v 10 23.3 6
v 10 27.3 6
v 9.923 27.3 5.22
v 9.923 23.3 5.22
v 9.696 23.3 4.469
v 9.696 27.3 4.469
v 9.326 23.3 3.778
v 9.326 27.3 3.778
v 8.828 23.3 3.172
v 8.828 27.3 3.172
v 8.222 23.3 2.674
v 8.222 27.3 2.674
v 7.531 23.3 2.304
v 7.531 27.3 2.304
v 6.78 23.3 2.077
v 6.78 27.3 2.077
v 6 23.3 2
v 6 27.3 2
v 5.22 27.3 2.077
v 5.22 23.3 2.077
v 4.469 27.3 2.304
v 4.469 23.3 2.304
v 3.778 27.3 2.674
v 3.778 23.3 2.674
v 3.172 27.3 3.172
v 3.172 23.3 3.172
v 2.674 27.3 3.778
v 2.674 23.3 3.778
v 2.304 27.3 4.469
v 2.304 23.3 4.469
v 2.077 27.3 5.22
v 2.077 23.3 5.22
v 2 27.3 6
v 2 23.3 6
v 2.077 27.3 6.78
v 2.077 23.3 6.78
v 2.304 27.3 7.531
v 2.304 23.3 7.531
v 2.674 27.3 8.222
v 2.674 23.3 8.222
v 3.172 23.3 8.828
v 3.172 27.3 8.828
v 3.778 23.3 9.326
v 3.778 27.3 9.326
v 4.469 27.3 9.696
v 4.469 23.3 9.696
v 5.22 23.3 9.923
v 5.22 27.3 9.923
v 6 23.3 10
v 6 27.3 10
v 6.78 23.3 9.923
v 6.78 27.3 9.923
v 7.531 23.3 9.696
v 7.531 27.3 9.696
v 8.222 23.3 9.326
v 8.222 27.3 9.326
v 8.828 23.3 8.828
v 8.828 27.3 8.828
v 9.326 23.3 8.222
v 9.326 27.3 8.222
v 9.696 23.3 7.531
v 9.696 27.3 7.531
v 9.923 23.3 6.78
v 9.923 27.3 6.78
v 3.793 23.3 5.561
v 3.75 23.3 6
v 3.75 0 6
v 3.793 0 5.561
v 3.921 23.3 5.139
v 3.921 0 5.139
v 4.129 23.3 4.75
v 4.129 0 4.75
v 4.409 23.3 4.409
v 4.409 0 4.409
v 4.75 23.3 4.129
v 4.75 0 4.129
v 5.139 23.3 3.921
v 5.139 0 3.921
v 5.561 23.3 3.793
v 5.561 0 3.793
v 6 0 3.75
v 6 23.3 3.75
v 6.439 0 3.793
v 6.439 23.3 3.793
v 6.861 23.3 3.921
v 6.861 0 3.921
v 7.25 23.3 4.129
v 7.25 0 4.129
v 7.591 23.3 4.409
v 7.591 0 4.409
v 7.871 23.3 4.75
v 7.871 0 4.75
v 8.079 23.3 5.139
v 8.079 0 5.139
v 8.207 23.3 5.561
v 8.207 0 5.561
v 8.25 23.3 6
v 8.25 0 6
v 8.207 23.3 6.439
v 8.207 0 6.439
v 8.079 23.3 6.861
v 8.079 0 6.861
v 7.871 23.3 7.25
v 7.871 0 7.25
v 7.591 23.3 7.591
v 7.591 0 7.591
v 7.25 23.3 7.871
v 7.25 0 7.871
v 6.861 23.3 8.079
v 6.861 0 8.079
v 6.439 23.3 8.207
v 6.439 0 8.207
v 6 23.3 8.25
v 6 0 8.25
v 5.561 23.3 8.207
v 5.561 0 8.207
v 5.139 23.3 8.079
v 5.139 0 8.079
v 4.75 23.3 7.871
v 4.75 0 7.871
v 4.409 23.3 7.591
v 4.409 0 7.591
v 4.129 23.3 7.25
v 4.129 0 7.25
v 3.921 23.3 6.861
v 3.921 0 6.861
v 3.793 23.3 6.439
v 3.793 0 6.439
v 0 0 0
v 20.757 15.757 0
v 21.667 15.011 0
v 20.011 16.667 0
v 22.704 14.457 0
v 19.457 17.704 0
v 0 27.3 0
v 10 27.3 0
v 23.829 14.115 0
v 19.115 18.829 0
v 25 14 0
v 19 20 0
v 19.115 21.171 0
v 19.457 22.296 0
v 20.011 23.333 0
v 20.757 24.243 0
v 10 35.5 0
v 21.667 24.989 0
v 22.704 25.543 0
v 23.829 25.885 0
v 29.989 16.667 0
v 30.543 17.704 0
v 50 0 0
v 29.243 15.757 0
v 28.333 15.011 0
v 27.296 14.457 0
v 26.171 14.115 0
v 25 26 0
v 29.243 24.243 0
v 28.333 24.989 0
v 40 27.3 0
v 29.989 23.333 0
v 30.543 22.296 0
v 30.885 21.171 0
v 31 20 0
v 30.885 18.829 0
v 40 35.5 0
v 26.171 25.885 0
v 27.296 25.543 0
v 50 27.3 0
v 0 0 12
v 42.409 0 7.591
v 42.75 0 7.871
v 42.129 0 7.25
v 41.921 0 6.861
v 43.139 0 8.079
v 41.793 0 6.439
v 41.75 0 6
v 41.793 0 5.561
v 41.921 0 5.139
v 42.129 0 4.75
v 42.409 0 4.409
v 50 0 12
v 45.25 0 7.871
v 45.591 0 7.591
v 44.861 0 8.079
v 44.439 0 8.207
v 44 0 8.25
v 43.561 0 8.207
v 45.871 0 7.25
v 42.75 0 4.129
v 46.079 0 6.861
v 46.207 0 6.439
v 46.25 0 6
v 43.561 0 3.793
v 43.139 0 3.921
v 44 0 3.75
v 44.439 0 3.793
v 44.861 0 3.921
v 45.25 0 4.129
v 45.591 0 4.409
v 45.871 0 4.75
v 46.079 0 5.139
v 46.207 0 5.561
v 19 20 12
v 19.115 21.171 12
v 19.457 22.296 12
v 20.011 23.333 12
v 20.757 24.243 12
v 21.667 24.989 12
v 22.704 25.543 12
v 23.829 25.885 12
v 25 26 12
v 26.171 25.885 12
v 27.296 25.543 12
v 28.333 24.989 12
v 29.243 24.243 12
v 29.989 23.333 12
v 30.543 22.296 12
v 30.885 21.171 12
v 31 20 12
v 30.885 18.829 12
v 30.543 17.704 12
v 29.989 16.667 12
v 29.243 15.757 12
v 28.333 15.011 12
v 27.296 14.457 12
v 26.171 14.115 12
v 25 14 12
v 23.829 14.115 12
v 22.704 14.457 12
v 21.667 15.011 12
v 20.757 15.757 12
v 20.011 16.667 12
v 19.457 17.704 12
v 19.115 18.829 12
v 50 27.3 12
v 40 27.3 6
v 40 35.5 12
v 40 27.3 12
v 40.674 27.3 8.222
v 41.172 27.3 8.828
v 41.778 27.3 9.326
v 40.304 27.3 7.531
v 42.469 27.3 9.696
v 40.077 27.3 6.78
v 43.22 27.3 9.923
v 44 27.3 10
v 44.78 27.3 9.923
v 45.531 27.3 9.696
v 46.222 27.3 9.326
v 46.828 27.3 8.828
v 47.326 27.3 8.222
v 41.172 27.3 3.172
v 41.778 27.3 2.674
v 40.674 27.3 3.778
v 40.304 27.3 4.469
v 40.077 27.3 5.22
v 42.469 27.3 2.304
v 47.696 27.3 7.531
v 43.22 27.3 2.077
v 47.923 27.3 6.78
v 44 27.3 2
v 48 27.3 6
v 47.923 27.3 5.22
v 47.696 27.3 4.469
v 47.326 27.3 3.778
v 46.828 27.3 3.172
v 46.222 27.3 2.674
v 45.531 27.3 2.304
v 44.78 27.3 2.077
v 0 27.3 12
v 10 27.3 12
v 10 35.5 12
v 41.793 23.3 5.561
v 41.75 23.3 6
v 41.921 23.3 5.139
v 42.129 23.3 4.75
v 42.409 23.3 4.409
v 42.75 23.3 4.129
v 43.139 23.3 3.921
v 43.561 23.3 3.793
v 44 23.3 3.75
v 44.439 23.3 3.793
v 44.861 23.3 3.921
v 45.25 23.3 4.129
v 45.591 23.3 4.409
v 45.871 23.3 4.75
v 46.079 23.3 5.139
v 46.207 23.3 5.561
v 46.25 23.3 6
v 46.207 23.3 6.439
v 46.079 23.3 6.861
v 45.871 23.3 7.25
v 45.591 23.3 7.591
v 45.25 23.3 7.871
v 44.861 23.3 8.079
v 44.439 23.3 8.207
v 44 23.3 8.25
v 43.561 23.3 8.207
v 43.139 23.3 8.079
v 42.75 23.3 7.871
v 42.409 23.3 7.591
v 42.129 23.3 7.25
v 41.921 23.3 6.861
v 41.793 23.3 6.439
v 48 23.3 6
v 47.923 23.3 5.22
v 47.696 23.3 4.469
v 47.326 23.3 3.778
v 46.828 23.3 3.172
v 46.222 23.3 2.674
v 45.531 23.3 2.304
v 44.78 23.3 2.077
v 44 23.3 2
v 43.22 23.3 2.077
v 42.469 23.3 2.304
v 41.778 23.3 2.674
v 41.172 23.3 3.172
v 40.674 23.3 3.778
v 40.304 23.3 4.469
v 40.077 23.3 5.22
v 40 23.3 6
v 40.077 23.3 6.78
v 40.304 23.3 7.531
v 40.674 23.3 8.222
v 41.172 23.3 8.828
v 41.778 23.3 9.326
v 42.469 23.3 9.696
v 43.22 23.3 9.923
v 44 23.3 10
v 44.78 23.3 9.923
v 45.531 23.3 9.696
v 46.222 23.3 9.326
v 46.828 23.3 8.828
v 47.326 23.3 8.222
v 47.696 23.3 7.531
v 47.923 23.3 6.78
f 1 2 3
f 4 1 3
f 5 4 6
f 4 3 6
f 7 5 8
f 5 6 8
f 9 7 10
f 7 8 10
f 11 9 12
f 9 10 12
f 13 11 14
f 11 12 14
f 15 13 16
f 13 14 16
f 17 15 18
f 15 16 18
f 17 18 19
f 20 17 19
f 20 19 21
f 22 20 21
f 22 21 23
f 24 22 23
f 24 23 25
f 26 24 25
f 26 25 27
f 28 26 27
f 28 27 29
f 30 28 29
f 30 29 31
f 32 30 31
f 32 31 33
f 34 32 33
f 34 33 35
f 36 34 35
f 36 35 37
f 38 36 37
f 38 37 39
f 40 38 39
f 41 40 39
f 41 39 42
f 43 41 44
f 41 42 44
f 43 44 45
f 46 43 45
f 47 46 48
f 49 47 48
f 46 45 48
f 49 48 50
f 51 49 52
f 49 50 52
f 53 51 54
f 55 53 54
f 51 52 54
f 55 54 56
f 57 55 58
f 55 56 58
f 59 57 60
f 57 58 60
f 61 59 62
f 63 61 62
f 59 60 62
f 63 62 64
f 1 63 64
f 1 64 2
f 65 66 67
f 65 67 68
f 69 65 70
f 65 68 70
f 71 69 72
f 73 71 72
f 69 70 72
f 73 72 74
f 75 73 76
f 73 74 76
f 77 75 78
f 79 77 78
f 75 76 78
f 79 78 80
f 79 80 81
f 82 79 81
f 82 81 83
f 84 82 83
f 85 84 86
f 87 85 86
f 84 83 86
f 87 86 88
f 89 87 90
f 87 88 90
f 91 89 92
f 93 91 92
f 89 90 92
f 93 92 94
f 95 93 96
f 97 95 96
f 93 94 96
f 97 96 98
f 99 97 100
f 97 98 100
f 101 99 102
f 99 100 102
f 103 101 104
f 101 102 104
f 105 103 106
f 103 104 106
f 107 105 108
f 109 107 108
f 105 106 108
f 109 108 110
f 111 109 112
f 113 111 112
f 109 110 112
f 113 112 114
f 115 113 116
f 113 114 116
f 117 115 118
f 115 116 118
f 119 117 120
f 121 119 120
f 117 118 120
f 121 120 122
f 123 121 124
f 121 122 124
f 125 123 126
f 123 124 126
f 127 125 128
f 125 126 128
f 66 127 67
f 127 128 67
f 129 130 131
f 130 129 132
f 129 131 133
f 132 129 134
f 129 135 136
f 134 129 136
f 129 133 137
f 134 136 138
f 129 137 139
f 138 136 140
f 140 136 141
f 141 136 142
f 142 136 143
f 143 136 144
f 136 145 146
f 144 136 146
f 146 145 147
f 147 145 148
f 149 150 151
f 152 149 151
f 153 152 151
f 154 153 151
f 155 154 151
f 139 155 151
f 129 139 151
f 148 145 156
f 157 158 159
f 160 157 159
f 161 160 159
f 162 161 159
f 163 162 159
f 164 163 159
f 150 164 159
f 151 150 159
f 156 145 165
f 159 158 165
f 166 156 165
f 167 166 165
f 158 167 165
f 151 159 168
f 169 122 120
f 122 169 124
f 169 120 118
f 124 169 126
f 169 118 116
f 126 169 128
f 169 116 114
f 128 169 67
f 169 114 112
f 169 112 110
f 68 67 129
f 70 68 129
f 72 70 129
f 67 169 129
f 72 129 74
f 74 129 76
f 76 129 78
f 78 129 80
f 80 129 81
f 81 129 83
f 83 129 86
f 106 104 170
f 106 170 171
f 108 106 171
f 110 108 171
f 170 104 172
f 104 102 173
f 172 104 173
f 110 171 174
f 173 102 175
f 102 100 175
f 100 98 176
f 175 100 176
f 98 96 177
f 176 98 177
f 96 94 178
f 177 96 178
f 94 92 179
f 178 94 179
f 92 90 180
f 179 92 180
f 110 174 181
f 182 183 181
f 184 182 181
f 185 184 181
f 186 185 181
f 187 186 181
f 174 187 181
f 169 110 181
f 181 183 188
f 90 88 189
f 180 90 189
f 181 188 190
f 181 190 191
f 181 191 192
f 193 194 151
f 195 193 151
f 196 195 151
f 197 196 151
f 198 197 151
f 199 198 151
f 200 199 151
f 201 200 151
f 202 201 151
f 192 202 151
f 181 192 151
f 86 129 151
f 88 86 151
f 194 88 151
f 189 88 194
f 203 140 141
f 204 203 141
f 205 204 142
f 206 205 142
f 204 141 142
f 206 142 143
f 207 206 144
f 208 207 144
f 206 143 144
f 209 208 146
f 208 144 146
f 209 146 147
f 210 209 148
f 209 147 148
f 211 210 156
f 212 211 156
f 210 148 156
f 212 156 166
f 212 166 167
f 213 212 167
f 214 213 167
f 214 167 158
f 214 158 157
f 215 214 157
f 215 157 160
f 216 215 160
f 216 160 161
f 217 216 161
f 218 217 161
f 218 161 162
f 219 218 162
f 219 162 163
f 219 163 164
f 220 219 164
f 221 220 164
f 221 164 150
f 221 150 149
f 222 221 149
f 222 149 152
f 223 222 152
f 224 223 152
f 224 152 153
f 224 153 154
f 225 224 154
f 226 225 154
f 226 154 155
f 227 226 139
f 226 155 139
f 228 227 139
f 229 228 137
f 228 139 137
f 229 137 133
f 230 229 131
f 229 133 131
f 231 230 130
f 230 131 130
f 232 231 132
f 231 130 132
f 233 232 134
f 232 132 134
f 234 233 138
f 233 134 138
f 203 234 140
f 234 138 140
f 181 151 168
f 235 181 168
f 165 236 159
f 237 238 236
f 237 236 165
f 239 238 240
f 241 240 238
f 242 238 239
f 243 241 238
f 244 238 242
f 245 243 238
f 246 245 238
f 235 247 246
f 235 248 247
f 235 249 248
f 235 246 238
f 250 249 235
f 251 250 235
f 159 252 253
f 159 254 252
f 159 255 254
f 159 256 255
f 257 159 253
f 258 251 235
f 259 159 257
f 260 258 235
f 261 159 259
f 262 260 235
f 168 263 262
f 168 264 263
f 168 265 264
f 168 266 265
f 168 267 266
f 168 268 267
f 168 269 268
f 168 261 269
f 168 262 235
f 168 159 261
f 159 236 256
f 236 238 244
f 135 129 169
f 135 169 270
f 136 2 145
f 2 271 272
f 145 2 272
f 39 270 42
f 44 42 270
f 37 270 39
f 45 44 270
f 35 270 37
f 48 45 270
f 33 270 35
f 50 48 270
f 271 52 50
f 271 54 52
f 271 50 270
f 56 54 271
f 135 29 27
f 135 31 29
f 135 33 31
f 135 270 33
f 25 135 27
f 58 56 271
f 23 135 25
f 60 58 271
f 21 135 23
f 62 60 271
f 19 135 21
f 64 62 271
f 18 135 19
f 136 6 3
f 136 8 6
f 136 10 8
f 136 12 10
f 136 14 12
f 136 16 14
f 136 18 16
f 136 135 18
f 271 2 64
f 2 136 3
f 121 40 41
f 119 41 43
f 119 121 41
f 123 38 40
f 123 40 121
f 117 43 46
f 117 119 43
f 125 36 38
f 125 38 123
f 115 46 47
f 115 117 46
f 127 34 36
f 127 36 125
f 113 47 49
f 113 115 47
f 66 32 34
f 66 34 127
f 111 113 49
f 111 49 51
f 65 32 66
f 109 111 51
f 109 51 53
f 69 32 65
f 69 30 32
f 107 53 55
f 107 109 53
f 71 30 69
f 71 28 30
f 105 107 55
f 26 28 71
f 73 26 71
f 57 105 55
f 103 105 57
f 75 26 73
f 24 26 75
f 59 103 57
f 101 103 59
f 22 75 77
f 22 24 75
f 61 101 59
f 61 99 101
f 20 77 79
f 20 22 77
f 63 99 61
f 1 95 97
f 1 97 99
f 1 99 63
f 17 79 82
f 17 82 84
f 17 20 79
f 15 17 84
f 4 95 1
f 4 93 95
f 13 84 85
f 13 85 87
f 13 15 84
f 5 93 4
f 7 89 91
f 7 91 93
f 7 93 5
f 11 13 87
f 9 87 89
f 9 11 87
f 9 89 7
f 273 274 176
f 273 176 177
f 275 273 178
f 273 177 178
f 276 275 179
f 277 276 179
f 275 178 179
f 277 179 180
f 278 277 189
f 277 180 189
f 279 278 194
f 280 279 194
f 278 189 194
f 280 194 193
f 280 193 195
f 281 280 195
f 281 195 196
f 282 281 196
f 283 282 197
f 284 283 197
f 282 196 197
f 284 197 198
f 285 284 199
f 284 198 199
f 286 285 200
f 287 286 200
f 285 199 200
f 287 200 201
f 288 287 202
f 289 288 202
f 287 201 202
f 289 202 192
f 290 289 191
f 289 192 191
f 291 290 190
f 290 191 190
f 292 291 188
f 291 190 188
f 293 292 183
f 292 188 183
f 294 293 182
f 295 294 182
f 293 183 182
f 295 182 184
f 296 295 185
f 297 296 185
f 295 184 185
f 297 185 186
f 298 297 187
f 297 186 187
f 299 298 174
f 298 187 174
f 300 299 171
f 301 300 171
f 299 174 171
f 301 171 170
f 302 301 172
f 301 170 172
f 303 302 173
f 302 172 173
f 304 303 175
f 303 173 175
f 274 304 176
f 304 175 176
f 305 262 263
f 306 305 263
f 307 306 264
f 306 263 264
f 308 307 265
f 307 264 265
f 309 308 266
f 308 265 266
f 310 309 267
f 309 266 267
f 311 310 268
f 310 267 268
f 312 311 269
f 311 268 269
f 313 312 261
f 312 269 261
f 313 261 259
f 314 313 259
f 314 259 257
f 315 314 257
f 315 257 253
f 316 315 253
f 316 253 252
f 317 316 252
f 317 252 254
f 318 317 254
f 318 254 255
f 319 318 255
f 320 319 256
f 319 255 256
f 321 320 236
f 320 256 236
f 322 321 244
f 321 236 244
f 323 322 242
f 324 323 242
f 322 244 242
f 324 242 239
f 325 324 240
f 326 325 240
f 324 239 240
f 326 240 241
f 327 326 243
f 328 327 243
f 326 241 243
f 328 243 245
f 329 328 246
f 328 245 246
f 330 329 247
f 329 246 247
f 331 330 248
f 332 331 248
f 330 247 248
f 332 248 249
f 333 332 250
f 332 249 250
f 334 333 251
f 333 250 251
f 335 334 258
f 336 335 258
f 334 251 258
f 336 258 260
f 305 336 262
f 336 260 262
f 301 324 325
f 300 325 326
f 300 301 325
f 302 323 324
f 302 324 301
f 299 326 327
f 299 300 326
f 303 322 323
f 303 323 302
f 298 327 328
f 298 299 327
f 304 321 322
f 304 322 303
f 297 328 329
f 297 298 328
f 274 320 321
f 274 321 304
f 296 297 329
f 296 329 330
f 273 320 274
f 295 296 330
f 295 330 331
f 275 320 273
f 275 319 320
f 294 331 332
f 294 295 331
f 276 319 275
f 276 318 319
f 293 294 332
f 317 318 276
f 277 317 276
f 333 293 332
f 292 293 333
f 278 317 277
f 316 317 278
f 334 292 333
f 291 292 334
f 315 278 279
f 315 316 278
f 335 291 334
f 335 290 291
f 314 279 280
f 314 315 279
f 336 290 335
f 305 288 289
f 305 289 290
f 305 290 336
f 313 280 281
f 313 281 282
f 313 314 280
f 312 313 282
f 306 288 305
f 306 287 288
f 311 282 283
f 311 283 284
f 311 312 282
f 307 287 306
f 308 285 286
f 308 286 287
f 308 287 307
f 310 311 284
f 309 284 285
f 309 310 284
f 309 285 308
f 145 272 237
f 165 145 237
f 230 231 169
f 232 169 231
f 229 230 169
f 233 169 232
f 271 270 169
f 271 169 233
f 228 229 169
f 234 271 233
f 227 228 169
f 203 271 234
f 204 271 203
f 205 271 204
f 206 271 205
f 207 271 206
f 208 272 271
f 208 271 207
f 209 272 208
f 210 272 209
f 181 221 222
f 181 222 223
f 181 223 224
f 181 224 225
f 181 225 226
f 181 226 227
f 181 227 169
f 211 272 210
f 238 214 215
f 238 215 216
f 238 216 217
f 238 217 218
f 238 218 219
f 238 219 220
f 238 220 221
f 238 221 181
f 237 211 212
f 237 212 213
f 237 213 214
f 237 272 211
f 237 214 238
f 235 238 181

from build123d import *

# Parameters (mm, degrees)
SKETCH_1_W                   = 50
SKETCH_1_H                   = 27.3
EXTRUDE_1_DEPTH              = 12
SKETCH_2_W                   = 30
SKETCH_2_H                   = 30
EXTRUDE_2_DEPTH              = 12
SKETCH_3_R                   = 6
CUT_EXTRUDE_1_DEPTH          = 63.483997951
HOLE_WIZARD_M4_3_D           = 4.5
HOLE_WIZARD_M4_3_CBORE_D     = 8
HOLE_WIZARD_M4_3_CBORE_DEPTH = 4


with BuildPart() as part:
    # 스케치1 → 보스-돌출1 (new body)
    with BuildSketch(Plane.XY):
        with Locations((25, 13.65)):
            Rectangle(SKETCH_1_W, SKETCH_1_H)
    extrude(amount=EXTRUDE_1_DEPTH)

    # 스케치2 → 보스-돌출2 (add)
    with BuildSketch(Plane.XY.offset(12)):
        with Locations((25, 20.5)):
            Rectangle(SKETCH_2_W, SKETCH_2_H)
    extrude(amount=-EXTRUDE_2_DEPTH)

    # 스케치3 → 컷-돌출1 (cut, through all)
    with BuildSketch(Plane(origin=(0, 0, 0), x_dir=(-1, 0, 0), z_dir=(0, 0, -1))):
        with Locations((-25, 20)):
            Circle(SKETCH_3_R)
    extrude(amount=-CUT_EXTRUDE_1_DEPTH, mode=Mode.SUBTRACT)

    # M4 소켓 머리 캡 나사용 카운터보어3 (through all)
    with Locations(Plane(origin=(0, 27.3, 0), x_dir=(1, 0, 0), z_dir=(0, 1, 0))):
        with Locations((44, -6), (6, -6)):
            CounterBoreHole(HOLE_WIZARD_M4_3_D / 2, HOLE_WIZARD_M4_3_CBORE_D / 2, HOLE_WIZARD_M4_3_CBORE_DEPTH)


solid = part.part
